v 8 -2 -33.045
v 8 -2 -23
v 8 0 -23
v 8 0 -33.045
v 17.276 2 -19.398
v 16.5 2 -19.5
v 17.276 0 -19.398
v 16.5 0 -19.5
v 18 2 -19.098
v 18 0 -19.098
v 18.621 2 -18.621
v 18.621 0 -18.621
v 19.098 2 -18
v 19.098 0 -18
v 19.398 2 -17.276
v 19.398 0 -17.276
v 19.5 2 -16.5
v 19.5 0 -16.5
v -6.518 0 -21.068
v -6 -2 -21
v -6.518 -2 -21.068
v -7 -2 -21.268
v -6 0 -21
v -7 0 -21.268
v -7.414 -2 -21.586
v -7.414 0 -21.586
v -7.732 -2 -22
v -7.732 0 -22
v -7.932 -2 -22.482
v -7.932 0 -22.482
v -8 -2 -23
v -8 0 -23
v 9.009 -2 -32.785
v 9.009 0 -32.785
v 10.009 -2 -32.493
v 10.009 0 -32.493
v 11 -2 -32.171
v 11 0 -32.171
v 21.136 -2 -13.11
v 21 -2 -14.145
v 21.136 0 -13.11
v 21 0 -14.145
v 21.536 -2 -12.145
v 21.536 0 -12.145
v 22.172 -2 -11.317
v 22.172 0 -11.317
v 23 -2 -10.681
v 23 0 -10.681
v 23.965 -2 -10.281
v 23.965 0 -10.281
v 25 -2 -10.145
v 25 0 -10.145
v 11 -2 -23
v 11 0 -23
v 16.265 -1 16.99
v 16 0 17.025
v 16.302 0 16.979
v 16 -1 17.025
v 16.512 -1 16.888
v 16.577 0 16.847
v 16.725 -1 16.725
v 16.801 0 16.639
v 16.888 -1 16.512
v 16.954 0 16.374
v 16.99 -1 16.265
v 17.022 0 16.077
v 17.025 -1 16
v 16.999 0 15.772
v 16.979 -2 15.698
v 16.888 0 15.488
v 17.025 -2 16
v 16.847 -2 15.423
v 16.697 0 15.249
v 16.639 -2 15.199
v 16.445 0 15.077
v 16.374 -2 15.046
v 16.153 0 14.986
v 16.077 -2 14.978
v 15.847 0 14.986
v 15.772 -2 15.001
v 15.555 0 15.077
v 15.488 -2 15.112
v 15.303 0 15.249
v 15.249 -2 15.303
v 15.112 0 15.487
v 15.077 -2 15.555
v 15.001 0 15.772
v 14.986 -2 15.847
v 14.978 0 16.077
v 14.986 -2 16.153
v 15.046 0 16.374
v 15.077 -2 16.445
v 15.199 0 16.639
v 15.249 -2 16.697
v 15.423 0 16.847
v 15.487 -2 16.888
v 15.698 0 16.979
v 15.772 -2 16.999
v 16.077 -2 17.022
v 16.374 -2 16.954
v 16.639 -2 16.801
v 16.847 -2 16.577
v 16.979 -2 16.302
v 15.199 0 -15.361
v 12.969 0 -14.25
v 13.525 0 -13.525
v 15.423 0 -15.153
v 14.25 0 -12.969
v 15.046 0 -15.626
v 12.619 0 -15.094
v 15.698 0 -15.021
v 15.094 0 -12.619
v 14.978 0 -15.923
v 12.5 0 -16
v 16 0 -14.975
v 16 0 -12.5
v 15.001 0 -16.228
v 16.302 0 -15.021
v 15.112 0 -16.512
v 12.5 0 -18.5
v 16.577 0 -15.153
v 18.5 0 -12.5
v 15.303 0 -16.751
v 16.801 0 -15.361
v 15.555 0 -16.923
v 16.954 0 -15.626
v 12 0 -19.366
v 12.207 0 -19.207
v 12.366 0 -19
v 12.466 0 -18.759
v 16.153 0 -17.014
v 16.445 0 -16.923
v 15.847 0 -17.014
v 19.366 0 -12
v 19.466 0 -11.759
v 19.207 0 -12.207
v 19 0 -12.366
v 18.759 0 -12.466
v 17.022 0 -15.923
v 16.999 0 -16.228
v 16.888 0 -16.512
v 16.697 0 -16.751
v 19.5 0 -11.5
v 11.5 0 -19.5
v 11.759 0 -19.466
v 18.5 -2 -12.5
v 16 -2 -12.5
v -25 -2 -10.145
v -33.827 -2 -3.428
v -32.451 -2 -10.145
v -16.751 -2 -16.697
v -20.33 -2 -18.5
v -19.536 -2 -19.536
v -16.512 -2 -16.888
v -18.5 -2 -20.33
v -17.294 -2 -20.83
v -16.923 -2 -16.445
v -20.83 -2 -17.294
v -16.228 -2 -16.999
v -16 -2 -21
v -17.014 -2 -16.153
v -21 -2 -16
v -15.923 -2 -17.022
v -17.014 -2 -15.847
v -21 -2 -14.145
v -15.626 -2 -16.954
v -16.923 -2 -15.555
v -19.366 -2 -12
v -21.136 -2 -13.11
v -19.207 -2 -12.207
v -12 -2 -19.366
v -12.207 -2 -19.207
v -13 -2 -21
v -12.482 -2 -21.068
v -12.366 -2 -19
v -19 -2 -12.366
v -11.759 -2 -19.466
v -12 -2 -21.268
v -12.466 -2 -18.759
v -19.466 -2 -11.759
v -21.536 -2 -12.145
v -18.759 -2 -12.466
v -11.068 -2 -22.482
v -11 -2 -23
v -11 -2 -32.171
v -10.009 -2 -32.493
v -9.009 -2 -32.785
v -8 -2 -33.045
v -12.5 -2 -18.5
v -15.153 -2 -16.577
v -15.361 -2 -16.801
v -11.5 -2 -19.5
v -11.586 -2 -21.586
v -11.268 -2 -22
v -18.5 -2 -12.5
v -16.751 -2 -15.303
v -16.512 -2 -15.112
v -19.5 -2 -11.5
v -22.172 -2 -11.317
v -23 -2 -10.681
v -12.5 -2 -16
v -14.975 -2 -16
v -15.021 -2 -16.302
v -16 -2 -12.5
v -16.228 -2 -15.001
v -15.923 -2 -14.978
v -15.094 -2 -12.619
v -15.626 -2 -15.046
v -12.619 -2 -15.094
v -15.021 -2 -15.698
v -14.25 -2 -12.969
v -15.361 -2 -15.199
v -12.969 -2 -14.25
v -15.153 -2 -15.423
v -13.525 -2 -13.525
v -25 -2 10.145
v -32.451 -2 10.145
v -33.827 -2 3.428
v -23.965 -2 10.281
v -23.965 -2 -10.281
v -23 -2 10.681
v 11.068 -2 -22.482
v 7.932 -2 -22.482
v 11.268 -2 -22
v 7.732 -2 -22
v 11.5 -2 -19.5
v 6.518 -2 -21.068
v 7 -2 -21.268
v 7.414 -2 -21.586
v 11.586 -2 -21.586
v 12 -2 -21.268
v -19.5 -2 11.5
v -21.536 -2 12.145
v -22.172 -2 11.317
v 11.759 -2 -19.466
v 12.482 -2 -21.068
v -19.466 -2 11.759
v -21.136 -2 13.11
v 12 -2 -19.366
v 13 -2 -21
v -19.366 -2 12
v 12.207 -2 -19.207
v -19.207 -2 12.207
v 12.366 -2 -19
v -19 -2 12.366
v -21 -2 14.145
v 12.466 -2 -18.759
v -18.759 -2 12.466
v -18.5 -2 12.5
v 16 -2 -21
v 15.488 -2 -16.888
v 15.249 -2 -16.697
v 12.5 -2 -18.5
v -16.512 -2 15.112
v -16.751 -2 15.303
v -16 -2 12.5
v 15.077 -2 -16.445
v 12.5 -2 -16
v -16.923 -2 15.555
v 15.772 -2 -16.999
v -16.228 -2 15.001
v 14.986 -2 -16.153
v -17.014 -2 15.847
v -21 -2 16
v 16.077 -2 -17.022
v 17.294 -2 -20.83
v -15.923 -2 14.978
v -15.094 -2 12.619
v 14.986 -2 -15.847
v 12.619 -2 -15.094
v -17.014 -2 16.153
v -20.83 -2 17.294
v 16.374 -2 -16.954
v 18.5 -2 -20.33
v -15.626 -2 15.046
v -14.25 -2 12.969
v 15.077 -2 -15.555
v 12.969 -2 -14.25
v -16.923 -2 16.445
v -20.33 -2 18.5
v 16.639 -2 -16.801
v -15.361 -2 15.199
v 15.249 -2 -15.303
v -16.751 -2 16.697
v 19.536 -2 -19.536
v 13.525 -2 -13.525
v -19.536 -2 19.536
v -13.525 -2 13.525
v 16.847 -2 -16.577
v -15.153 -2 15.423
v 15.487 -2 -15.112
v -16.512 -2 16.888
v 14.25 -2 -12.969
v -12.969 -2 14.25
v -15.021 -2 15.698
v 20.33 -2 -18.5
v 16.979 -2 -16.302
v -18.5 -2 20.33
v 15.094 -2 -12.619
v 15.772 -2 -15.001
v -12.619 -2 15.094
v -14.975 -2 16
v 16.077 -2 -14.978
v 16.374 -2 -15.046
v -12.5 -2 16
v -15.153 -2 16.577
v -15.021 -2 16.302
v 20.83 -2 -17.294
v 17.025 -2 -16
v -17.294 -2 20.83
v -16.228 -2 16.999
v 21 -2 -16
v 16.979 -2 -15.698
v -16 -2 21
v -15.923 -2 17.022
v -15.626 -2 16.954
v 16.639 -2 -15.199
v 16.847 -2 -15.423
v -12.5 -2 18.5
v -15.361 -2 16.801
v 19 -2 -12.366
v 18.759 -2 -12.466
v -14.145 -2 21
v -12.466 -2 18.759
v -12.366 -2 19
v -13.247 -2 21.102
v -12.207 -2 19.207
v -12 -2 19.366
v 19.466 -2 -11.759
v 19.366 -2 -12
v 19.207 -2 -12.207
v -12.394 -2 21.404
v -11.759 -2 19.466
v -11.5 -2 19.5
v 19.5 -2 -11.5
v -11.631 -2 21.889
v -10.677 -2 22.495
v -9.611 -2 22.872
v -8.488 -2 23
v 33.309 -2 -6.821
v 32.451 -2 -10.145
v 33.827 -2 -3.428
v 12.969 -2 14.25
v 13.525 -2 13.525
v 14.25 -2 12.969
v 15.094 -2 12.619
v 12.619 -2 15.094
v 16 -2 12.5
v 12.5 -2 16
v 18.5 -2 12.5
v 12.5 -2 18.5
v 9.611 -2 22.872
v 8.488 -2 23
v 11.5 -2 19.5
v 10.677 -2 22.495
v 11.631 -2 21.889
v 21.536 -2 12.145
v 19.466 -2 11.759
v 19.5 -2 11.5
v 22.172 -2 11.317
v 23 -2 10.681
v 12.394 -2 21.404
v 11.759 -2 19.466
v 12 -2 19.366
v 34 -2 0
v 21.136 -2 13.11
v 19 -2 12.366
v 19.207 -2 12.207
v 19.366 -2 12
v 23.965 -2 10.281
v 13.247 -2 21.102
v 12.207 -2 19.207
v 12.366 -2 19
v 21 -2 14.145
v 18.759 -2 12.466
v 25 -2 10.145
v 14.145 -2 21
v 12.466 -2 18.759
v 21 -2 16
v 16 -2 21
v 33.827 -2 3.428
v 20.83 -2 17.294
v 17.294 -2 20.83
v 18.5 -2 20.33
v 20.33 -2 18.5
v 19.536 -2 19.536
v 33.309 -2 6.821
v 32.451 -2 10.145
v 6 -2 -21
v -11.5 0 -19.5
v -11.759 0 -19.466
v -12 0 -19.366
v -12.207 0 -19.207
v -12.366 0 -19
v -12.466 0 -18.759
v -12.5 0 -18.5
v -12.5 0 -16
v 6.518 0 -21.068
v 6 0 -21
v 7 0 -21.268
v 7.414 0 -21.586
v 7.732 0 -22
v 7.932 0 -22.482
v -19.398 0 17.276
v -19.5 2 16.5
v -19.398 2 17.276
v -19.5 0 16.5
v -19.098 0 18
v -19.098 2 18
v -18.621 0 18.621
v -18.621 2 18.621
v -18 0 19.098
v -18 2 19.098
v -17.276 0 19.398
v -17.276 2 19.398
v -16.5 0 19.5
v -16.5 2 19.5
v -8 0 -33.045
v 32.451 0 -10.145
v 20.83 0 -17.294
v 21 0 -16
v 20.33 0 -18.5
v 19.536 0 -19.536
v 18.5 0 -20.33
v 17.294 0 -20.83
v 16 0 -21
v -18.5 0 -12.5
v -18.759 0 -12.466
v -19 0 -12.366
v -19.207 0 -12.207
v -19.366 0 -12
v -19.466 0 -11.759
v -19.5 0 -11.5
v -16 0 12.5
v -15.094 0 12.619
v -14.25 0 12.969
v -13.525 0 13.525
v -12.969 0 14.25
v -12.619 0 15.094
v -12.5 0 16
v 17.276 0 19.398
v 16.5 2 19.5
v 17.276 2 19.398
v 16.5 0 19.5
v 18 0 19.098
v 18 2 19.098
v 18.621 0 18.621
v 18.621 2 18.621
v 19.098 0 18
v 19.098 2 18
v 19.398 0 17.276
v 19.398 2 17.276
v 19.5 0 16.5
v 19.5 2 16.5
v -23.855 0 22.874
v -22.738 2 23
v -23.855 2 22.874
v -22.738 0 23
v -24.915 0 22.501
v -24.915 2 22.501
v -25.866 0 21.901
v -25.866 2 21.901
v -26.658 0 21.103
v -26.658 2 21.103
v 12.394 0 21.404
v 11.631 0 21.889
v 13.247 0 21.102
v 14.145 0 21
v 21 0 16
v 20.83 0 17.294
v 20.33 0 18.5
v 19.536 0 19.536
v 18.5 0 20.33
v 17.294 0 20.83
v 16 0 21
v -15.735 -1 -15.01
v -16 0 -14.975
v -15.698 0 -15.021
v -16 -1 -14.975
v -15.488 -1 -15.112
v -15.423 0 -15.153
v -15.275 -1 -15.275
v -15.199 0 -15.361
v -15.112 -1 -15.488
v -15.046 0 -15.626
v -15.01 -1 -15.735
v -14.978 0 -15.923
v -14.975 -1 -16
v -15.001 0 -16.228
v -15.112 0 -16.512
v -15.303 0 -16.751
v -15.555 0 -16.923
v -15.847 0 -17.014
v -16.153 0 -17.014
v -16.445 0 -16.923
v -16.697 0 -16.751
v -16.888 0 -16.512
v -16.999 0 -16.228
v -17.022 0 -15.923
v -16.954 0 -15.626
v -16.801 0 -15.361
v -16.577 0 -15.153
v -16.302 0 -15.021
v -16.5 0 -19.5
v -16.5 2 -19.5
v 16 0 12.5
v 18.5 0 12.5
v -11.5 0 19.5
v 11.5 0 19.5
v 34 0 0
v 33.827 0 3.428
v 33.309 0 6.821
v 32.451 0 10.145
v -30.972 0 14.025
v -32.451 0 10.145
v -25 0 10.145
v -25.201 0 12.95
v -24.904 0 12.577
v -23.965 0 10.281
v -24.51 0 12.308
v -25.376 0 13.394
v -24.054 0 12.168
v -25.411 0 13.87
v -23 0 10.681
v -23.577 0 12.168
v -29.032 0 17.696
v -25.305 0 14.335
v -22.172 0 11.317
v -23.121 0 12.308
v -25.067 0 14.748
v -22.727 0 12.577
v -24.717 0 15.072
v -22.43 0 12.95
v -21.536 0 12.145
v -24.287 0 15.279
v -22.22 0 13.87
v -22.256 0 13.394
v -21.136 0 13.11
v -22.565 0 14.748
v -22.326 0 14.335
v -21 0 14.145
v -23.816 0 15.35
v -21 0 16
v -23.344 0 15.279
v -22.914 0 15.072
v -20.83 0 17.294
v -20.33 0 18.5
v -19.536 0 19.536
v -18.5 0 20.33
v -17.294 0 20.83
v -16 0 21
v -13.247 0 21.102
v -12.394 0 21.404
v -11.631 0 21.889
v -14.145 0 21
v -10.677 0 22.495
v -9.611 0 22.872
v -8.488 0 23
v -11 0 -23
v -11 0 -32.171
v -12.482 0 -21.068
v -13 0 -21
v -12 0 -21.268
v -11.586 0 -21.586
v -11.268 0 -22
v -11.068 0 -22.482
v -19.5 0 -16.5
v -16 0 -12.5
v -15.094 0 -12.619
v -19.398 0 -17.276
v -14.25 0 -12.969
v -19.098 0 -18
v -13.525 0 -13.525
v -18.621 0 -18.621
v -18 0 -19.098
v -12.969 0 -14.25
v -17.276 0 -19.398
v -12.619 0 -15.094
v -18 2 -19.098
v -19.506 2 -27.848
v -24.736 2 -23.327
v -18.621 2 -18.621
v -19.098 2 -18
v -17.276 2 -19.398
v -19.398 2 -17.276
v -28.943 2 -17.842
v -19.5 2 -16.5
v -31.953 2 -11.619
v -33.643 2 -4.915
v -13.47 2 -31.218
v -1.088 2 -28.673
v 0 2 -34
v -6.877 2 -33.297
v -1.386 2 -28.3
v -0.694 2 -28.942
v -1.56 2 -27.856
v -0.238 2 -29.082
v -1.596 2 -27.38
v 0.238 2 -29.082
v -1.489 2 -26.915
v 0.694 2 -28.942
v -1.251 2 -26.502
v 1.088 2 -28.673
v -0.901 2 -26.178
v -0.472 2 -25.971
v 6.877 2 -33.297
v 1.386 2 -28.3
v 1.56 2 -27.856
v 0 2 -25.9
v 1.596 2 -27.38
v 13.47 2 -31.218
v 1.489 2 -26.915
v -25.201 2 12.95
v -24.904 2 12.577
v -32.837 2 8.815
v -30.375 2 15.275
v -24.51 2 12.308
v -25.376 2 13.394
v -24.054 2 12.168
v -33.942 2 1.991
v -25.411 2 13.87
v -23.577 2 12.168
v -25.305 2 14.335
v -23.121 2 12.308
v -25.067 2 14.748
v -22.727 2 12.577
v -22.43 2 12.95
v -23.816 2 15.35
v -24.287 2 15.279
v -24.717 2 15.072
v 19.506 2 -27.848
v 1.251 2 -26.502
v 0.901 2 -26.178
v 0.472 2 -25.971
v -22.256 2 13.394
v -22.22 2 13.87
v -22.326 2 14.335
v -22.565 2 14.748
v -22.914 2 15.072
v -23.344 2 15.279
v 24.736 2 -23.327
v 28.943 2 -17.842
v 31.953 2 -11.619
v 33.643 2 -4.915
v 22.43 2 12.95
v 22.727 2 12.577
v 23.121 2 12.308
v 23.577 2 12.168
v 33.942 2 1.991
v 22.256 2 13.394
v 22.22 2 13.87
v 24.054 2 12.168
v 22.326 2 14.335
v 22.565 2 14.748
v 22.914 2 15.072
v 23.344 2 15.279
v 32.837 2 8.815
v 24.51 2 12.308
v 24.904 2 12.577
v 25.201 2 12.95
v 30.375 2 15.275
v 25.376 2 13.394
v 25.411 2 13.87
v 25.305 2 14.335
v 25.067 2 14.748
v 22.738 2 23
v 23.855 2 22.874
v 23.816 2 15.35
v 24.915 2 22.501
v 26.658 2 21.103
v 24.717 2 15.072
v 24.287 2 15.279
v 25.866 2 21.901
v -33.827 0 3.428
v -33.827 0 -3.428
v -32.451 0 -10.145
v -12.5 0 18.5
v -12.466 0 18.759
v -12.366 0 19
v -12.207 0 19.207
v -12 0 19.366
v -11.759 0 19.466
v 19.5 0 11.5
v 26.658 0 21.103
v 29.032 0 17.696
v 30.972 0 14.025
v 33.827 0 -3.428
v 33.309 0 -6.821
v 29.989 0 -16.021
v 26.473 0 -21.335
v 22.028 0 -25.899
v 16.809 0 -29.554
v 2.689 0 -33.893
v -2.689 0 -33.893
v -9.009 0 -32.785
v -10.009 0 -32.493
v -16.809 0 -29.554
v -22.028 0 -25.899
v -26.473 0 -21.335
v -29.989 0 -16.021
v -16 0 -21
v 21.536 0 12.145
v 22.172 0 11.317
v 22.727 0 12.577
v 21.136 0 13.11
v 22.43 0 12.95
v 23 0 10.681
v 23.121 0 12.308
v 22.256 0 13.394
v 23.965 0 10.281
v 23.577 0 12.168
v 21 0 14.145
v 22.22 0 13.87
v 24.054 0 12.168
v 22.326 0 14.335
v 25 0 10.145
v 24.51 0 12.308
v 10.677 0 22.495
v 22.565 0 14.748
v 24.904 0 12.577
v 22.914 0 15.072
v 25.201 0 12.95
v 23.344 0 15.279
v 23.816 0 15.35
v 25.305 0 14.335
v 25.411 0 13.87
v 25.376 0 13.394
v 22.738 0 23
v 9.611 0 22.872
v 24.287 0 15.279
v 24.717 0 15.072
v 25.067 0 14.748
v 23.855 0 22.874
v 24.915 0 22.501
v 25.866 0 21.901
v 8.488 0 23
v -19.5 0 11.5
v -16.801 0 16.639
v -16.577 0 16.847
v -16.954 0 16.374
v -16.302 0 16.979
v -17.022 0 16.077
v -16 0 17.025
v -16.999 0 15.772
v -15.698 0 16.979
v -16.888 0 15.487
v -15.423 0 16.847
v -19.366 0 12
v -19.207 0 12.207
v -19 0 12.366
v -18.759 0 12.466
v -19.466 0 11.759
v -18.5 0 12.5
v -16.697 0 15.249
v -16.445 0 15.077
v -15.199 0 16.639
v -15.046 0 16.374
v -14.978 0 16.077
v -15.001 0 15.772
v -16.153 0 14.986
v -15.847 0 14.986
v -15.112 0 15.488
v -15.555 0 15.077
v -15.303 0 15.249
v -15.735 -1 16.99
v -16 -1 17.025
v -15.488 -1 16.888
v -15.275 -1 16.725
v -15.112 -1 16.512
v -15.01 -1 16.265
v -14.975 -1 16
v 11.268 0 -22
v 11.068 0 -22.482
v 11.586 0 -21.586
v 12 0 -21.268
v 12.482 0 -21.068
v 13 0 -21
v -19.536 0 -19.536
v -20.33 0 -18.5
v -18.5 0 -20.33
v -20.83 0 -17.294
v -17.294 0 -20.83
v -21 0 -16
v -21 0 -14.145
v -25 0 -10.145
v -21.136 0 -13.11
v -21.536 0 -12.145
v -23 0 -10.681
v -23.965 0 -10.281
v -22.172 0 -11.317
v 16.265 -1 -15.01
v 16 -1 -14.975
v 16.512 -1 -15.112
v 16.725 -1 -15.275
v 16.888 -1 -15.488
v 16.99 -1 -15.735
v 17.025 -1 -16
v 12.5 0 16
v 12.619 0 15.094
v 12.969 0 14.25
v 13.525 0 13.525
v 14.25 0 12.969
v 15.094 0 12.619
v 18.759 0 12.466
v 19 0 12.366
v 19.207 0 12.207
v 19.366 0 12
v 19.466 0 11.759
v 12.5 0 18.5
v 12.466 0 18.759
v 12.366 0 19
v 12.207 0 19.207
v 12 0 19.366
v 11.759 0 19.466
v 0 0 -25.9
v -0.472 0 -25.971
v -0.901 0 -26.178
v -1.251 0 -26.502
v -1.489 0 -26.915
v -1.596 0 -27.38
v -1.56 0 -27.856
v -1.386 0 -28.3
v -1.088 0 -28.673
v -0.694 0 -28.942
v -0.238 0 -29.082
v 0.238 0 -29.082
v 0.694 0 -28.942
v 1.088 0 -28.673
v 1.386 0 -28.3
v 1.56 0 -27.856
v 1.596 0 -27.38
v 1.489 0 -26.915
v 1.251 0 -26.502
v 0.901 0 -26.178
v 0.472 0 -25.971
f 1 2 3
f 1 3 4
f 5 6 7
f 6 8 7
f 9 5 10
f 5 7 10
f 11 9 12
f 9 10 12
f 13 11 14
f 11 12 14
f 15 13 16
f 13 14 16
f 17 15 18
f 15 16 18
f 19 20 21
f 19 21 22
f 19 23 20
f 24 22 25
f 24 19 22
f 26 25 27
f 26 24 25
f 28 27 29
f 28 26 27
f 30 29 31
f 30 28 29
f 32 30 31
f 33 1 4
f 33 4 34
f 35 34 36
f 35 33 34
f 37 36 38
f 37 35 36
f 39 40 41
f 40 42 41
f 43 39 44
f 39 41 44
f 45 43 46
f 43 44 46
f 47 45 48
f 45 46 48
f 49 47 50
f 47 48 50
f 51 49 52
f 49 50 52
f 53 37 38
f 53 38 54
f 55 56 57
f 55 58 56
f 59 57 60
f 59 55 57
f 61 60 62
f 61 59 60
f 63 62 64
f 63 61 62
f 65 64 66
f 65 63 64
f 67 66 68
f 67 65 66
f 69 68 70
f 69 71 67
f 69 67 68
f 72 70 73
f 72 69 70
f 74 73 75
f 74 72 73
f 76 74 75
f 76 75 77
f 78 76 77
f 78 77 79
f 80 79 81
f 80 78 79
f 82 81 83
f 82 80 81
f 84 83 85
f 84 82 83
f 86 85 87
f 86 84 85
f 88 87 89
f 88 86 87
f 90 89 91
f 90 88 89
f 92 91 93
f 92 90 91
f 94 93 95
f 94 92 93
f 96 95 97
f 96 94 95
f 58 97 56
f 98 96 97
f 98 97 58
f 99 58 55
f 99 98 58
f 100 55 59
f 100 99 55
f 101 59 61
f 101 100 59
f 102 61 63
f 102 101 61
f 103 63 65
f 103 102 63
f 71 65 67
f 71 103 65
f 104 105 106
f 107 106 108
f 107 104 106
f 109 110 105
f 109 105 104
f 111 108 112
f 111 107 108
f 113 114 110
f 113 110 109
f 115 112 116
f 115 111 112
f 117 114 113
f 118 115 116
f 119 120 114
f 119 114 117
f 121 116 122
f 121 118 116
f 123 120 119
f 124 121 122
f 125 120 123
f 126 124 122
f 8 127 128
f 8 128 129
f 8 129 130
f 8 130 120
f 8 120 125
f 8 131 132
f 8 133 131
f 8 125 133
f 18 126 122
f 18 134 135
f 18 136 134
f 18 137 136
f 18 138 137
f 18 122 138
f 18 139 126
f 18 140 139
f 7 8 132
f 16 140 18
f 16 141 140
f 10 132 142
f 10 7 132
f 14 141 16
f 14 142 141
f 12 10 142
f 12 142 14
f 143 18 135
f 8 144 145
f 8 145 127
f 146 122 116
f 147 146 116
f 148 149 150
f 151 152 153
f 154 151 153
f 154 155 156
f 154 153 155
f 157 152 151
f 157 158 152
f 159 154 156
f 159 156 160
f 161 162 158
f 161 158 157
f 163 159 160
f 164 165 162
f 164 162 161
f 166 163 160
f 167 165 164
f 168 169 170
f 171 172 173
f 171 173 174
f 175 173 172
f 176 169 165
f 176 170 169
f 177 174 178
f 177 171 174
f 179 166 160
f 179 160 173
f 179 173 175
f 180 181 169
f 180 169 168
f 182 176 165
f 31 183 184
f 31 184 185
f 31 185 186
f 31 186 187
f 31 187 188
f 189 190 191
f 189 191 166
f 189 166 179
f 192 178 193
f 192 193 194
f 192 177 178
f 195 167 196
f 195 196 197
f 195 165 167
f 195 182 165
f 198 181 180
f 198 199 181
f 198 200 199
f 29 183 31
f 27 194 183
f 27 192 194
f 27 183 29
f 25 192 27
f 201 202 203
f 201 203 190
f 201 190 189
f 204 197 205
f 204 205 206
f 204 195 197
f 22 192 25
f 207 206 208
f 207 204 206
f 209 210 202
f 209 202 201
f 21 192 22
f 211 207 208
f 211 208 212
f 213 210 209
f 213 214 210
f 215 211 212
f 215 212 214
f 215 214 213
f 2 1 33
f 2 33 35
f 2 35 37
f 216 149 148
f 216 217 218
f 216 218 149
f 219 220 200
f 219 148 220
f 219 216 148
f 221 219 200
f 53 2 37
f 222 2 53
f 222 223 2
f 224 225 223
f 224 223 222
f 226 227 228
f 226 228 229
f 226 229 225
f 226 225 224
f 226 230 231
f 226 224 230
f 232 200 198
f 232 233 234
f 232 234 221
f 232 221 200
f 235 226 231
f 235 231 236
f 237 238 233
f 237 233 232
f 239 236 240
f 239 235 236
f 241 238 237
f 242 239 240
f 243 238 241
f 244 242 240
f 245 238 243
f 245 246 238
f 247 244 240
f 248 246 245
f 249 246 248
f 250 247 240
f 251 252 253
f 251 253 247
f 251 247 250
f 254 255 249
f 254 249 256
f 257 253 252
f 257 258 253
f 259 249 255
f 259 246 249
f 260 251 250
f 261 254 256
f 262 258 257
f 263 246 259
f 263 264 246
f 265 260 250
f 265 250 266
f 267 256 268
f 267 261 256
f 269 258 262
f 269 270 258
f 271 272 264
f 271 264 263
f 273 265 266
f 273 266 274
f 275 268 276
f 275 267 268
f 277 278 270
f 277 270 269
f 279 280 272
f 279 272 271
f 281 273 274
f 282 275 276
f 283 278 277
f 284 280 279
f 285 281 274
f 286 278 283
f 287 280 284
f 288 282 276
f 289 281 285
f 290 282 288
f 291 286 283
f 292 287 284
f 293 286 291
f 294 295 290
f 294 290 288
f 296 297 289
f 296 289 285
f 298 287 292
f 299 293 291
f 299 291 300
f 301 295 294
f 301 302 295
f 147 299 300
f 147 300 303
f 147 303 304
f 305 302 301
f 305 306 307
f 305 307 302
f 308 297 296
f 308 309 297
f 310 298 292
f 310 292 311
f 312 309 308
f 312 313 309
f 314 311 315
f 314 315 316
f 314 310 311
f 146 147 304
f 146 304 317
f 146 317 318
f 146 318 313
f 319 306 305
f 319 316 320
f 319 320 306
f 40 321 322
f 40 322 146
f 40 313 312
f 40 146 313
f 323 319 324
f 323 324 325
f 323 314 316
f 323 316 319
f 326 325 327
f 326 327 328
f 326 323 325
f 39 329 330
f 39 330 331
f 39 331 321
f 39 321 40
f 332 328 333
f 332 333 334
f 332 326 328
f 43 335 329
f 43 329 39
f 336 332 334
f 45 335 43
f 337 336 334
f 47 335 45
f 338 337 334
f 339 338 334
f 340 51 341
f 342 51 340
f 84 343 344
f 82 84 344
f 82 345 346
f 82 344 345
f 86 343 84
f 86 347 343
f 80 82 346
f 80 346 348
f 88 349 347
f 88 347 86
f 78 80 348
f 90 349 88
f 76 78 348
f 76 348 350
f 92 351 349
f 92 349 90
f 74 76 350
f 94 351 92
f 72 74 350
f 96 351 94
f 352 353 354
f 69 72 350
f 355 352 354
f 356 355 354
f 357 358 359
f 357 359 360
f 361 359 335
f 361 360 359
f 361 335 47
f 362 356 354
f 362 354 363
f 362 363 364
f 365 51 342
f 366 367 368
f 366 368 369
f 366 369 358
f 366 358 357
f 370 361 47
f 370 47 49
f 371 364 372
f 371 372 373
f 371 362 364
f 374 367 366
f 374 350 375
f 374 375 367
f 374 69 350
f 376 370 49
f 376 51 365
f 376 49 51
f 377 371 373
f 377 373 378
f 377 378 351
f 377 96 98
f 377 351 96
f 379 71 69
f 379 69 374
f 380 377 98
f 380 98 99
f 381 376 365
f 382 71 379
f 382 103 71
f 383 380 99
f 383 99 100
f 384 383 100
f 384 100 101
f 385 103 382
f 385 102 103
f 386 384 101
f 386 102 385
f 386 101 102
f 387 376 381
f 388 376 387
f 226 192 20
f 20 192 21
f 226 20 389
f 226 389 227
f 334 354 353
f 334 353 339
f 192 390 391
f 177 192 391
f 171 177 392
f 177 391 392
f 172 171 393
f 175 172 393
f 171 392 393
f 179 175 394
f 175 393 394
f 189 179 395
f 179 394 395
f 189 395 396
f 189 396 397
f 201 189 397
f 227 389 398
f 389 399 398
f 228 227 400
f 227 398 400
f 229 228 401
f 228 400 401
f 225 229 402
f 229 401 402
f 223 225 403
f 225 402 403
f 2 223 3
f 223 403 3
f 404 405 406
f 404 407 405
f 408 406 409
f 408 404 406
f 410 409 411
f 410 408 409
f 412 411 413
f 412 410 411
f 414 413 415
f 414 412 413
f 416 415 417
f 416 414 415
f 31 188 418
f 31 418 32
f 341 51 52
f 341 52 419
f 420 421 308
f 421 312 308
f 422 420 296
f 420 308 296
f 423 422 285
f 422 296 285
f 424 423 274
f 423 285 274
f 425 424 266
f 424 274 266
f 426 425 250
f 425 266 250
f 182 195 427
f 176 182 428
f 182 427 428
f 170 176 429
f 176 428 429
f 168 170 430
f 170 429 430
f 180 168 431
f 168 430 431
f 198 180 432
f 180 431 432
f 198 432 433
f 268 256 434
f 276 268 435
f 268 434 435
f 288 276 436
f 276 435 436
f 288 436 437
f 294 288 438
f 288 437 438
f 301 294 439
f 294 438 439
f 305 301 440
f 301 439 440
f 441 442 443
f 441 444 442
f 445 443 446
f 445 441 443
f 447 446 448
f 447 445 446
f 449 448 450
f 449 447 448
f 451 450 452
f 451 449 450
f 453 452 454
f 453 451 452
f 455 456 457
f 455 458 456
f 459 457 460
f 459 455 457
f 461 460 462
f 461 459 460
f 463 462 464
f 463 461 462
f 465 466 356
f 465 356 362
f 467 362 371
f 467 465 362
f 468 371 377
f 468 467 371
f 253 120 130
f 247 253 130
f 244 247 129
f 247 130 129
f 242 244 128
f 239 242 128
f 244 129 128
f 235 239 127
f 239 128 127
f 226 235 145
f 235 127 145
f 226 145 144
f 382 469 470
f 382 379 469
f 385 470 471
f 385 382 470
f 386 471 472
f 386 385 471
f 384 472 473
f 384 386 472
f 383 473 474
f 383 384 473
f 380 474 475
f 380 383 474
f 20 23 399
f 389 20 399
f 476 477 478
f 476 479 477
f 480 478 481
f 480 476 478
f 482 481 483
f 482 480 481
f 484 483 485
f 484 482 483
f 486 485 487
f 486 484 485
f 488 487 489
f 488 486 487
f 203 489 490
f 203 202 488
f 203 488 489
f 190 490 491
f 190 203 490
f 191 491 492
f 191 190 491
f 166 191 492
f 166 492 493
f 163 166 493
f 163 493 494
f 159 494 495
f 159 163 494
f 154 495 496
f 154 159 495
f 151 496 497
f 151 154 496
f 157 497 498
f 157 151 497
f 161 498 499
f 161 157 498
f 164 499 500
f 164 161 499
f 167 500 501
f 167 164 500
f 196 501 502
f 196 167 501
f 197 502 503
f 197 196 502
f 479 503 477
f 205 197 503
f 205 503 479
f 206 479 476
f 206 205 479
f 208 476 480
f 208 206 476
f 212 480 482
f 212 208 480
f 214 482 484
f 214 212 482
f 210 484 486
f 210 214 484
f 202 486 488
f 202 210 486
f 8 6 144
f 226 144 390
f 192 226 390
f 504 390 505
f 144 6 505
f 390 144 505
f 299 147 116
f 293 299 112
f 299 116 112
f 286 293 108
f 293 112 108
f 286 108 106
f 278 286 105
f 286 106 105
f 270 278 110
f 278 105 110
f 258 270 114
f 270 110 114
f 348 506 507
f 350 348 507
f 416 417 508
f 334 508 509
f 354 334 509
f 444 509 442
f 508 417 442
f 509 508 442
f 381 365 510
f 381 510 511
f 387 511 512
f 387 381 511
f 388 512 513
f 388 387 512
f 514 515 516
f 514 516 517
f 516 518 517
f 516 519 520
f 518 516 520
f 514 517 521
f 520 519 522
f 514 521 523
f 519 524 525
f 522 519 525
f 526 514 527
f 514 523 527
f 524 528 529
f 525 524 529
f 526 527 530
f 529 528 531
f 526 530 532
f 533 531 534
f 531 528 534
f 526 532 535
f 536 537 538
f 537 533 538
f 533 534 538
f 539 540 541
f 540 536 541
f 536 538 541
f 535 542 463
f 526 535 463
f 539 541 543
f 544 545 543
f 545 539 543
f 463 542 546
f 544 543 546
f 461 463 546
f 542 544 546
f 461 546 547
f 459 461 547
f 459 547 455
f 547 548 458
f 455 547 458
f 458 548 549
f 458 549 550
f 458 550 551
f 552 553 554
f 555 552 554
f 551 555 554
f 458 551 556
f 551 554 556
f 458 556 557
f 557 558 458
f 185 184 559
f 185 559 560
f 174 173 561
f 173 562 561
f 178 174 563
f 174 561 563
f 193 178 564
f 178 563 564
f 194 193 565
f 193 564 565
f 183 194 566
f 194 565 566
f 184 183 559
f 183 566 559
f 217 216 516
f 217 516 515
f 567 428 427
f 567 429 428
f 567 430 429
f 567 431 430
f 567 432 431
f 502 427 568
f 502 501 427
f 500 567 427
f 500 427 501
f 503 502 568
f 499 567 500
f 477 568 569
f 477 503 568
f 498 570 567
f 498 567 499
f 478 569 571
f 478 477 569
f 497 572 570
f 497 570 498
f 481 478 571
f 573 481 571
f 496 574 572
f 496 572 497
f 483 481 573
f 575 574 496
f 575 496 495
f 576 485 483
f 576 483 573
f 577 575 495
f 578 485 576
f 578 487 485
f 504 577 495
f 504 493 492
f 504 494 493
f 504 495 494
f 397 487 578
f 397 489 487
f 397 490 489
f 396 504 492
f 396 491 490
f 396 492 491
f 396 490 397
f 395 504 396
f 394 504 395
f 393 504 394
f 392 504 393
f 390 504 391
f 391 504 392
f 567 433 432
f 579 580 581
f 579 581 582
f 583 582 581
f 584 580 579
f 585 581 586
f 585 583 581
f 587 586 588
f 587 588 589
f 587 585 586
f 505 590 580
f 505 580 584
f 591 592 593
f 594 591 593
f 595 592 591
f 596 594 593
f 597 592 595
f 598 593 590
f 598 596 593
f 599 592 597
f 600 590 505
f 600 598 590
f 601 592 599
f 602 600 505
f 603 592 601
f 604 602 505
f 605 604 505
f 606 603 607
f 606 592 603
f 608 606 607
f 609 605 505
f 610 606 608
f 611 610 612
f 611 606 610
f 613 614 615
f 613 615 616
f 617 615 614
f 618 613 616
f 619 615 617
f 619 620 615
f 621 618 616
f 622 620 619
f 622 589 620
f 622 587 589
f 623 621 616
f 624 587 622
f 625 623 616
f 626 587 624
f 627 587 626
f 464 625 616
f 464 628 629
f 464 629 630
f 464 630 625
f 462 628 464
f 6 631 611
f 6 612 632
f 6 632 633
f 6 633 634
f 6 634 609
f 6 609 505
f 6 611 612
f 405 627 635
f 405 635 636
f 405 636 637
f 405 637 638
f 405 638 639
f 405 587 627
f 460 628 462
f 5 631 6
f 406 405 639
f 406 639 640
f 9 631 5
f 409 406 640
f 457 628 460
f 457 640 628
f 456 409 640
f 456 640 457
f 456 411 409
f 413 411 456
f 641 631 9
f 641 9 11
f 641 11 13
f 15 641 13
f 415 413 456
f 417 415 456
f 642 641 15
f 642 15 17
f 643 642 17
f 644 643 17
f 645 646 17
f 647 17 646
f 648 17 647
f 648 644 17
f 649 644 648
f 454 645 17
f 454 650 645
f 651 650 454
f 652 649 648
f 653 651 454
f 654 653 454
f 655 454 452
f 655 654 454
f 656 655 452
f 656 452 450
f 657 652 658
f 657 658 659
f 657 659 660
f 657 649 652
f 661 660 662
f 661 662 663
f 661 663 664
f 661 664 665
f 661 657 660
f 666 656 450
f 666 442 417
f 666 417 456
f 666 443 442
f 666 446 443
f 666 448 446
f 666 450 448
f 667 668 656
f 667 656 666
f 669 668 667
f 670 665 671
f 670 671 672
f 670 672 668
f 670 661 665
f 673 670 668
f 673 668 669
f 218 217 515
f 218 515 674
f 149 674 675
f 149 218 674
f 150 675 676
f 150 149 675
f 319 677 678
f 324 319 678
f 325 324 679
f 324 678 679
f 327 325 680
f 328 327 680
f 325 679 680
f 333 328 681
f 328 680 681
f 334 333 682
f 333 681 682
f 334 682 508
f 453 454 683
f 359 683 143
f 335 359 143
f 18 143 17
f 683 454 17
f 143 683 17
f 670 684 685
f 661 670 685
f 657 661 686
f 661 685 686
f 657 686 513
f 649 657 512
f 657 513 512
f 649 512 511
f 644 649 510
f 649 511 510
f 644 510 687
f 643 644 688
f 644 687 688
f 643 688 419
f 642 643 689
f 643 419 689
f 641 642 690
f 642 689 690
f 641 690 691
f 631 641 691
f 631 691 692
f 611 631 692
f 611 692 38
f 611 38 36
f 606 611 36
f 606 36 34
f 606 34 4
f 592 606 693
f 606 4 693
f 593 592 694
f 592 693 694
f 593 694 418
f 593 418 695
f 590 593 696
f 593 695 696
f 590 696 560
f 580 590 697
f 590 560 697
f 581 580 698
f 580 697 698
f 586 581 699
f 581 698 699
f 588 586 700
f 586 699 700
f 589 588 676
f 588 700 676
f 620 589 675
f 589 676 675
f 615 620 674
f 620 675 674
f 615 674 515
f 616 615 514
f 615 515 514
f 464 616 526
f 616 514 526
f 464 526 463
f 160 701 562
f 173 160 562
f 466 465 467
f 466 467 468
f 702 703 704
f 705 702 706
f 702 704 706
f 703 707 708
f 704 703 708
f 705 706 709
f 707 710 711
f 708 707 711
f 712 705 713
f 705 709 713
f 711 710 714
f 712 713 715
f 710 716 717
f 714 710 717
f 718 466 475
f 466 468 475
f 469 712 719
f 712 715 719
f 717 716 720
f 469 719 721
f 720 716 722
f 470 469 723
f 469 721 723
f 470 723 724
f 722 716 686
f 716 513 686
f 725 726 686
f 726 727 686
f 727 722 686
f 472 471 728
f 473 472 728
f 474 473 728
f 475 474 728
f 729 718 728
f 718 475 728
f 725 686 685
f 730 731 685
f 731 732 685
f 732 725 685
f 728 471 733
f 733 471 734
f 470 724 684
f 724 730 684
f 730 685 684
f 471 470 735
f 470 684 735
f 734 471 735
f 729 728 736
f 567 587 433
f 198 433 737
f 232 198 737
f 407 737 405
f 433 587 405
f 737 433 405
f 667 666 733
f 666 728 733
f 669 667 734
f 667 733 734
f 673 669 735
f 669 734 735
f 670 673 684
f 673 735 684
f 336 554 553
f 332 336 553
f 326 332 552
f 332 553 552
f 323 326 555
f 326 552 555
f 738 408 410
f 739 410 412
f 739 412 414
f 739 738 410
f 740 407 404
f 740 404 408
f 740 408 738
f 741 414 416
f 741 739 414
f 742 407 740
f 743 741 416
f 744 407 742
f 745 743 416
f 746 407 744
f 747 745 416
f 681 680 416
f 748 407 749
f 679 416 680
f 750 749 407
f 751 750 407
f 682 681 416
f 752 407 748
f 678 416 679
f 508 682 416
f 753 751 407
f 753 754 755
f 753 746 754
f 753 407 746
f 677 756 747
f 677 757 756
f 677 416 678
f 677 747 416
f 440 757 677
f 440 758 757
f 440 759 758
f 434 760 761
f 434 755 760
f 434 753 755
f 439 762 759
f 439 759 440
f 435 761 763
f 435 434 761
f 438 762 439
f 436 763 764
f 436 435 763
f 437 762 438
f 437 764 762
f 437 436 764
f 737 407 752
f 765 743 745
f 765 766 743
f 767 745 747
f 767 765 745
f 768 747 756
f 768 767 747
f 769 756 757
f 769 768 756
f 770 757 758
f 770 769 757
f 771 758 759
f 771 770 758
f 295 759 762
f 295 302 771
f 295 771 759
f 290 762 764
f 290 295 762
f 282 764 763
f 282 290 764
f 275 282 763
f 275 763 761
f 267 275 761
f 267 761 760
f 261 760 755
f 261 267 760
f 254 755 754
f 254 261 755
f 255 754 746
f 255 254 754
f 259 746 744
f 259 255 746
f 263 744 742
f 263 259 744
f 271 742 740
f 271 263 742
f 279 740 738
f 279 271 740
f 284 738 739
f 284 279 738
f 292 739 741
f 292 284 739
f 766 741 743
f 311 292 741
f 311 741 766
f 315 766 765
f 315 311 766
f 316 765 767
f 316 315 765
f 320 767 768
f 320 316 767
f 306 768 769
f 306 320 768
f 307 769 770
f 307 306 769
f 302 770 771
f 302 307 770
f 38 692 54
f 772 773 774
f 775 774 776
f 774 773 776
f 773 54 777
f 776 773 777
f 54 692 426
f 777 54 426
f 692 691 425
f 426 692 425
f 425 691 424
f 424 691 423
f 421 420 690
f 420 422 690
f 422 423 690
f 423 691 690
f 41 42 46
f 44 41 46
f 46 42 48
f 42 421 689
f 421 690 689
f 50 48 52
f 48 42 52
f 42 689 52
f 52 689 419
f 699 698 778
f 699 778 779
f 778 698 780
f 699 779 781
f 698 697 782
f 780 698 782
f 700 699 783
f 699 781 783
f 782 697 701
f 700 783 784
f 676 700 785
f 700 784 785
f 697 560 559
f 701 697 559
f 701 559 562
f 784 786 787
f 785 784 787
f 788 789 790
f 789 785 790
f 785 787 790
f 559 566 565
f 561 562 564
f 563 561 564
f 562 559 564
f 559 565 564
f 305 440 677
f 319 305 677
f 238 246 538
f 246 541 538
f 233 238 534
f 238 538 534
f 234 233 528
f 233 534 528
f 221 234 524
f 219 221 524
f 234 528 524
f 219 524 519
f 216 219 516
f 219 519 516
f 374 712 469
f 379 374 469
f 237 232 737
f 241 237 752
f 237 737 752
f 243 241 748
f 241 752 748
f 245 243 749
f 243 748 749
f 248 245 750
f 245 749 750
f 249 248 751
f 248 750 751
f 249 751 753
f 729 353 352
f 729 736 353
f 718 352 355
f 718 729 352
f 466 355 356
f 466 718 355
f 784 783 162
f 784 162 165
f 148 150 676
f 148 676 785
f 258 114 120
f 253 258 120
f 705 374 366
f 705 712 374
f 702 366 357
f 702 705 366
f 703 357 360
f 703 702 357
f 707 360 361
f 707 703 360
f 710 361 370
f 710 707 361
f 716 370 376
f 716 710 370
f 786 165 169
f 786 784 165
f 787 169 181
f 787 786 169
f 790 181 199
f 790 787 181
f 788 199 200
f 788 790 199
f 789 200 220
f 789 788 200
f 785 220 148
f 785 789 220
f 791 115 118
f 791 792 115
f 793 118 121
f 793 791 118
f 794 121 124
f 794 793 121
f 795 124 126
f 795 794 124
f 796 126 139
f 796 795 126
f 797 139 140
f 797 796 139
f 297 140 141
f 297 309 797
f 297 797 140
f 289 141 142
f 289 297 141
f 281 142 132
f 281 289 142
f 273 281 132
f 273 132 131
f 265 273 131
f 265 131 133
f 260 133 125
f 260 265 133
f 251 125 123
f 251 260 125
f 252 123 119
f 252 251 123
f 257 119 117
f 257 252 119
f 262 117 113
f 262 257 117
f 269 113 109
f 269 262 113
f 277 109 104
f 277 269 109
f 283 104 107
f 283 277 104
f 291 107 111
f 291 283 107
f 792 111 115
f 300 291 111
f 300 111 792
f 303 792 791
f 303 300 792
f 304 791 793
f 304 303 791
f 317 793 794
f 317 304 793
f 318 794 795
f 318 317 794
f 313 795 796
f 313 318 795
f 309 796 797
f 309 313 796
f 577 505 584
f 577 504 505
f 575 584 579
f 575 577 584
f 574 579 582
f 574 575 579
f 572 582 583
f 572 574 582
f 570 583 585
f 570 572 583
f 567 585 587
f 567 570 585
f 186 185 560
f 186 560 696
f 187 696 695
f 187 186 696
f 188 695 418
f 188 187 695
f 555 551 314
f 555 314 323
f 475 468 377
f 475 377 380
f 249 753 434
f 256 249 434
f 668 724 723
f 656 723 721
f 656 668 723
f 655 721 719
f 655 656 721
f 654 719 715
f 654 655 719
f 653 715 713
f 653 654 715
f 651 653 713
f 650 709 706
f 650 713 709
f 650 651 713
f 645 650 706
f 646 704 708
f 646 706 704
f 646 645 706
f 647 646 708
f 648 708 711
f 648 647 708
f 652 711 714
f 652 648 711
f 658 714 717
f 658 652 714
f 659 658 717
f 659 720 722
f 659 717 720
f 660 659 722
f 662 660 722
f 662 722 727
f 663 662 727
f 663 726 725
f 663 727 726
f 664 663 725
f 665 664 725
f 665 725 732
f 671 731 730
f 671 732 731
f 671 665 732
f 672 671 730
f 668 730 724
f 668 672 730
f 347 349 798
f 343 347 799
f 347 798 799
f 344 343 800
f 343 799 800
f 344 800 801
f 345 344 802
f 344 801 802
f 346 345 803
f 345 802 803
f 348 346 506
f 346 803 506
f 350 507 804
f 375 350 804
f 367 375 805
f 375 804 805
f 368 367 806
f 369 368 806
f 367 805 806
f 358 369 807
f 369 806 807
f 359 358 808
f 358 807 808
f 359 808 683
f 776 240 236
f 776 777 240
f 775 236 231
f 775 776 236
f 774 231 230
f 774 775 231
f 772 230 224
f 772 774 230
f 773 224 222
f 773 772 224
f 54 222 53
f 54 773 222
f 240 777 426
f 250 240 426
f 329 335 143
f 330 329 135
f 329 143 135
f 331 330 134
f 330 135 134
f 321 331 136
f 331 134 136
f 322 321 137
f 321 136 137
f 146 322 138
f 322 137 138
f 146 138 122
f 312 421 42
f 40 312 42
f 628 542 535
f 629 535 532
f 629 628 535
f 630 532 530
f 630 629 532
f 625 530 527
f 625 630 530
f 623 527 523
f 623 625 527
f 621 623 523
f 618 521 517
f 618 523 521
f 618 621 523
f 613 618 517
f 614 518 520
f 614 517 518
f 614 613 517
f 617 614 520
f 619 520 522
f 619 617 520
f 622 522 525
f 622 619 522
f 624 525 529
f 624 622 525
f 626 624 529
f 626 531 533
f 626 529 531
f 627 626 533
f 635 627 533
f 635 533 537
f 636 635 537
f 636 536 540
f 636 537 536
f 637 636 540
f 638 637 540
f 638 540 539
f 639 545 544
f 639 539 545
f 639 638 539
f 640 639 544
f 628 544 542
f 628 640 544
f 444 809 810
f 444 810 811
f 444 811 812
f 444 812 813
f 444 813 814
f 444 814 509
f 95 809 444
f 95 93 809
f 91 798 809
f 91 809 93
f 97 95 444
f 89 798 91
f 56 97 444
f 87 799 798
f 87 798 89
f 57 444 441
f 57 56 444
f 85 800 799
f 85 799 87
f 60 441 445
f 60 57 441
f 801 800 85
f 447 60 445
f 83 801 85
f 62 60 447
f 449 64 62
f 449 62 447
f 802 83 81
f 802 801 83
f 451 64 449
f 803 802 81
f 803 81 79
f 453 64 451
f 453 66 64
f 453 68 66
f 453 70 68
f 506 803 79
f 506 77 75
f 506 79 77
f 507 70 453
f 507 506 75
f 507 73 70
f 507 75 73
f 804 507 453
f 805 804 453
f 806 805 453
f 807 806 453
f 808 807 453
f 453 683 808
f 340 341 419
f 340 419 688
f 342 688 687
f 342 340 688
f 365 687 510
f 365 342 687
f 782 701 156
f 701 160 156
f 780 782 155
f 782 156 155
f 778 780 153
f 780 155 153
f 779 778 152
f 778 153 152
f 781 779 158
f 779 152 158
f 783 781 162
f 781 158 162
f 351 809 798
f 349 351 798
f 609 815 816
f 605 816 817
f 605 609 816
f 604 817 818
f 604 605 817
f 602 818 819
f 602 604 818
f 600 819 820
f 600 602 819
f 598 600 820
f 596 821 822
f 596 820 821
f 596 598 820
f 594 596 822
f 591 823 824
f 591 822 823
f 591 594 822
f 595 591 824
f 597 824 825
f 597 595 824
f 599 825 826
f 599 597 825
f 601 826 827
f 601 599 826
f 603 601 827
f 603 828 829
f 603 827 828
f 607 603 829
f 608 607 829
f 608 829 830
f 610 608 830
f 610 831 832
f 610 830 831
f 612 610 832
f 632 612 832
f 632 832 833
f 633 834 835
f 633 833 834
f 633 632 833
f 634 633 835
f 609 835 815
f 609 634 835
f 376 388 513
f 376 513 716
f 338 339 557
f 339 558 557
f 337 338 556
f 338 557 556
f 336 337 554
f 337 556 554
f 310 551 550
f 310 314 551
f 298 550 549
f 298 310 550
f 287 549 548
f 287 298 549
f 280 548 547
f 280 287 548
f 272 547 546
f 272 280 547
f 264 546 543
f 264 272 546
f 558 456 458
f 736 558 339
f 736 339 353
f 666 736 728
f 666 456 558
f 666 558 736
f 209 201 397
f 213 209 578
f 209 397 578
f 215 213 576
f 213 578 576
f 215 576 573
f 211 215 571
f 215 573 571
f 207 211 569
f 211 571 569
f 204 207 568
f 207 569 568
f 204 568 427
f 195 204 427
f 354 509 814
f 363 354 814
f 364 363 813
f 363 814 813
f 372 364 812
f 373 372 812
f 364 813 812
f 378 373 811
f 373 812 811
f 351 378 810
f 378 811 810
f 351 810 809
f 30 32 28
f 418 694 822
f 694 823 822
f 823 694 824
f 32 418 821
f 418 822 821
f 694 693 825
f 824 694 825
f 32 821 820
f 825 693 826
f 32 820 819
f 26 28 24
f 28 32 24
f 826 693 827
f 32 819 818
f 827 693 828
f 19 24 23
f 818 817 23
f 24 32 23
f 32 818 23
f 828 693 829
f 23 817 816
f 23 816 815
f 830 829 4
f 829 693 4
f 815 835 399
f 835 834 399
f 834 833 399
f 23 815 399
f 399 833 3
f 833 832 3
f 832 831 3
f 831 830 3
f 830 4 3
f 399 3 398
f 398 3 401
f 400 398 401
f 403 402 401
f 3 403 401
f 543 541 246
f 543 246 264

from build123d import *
from build123d.topology import SkipClean

# Parameters (mm, degrees)
SKETCH1_R                         = 34
BOSS_EXTRUDE1_DEPTH               = 2
M2_CLEARANCE_HOLE1_D              = 2.4
SKETCH11_W                        = 42
SKETCH11_H                        = 42
BOSS_EXTRUDE3_DEPTH               = 2
TAP_START                         = -2
TAP_DRILL_FOR_M2_5_TAP1_OUTLINE_R = 1.025
TAP_DRILL_FOR_M2_5_TAP1_DEPTH     = 4
CUT_EXTRUDE1_DEPTH                = 49.124837662
CUT_EXTRUDE1_DEPTH_BACK           = 2
SKETCH10_R                        = 1.6
SKETCH12_W                        = 39
SKETCH12_H                        = 39
CUT_EXTRUDE2_DEPTH                = 3
SKETCH13_R                        = 1.025
BOSS_EXTRUDE4_DEPTH               = 1
FILLET1_R                         = 1
FILLET2_R                         = 5
CUT_EXTRUDE3_DEPTH                = 49.176757882
BOSS_EXTRUDE5_START               = 2
BOSS_EXTRUDE5_DEPTH               = 2
FILLET3_R                         = 4
FILLET4_R                         = 2
FILLET5_R                         = 3
CUT_EXTRUDE4_DEPTH                = 49.124837662
CUT_EXTRUDE4_DEPTH_BACK           = 49.124837662
SKETCH16_W                        = 58.171472577
SKETCH16_H                        = 11
FILLET6_R                         = 5


# Read off the part's stored shape, not the designer's step: Tap Drill for M2.5 Tap1
with BuildPart() as part:
    # Sketch1 → Boss-Extrude1 (new body)
    with BuildSketch(Plane(origin=(0, 0, 0), x_dir=(1, 0, 0), z_dir=(0, 1, 0))):
        with Locations(Location((0, 0, 0), (0, 0, 270))):
            Circle(SKETCH1_R)
    extrude(amount=BOSS_EXTRUDE1_DEPTH)

    # M2 Clearance Hole1 (through all)
    with Locations(Plane(origin=(0, 2, 0), x_dir=(1, 0, 0), z_dir=(0, 1, 0))):
        with Locations((-23.815698604, -13.75), (0, 27.5), (23.815698604, -13.75)):
            Hole(M2_CLEARANCE_HOLE1_D / 2)

    # Sketch11 → Boss-Extrude3 (add)
    with BuildSketch(Plane.XZ):
        Rectangle(SKETCH11_W, SKETCH11_H)
    extrude(amount=BOSS_EXTRUDE3_DEPTH)

    # Tap Drill for M2.5 Tap1 outline → Tap Drill for M2.5 Tap1 (cut)
    with BuildSketch(Plane(origin=(0, 0, 0), x_dir=(1, 0, 0), z_dir=(0, 1, 0)).offset(TAP_START)):
        with Locations((-16, 16)):
            Circle(TAP_DRILL_FOR_M2_5_TAP1_OUTLINE_R)
        with Locations((16, -16)):
            Circle(TAP_DRILL_FOR_M2_5_TAP1_OUTLINE_R)
        with Locations((16, 16)):
            Circle(TAP_DRILL_FOR_M2_5_TAP1_OUTLINE_R)
        with Locations((-16, -16)):
            Circle(TAP_DRILL_FOR_M2_5_TAP1_OUTLINE_R)
    extrude(amount=TAP_DRILL_FOR_M2_5_TAP1_DEPTH, mode=Mode.SUBTRACT)

    # Sketch10 → Cut-Extrude1 (cut, two sides: drawn at the far end of the back side and taken through both)
    with BuildSketch(Plane.XZ.offset(-CUT_EXTRUDE1_DEPTH_BACK)):
        with Locations(Location((0, -27.5, 0), (0, 0, 90))):
            Circle(SKETCH10_R)
        with Locations(Location((-23.815698604, 13.75, 0), (0, 0, 90))):
            Circle(SKETCH10_R)
        with Locations(Location((23.815698604, 13.75, 0), (0, 0, 90))):
            Circle(SKETCH10_R)
    extrude(amount=CUT_EXTRUDE1_DEPTH + CUT_EXTRUDE1_DEPTH_BACK, mode=Mode.SUBTRACT)

    # Sketch12 → Cut-Extrude2 (cut)
    with BuildSketch(Plane(origin=(0, 2, 0), x_dir=(1, 0, 0), z_dir=(0, 1, 0))):
        Rectangle(SKETCH12_W, SKETCH12_H)
    extrude(amount=-CUT_EXTRUDE2_DEPTH, mode=Mode.SUBTRACT)

    # Sketch13 → Boss-Extrude4 (add)
    # profile 1 of 4: a face of its own
    with BuildSketch(Plane(origin=(0, -1, 0), x_dir=(1, 0, 0), z_dir=(0, 1, 0))):
        with BuildLine():
            Line((-12.5, 16), (-12.5, 19.5))
            Line((-12.5, 19.5), (-19.5, 19.5))
            Line((-19.5, 19.5), (-19.5, 12.5))
            Line((-19.5, 12.5), (-16, 12.5))
            ThreePointArc((-16, 12.5), (-13.525126266, 13.525126266), (-12.5, 16))
        make_face()
        with Locations(Location((-16, 16, 0), (0, 0, 270))):
            Circle(SKETCH13_R, mode=Mode.SUBTRACT)
    # profile 2 of 4: a face of its own
    with BuildSketch(Plane(origin=(0, -1, 0), x_dir=(1, 0, 0), z_dir=(0, 1, 0))):
        with BuildLine():
            Line((16, 12.5), (19.5, 12.5))
            Line((19.5, 12.5), (19.5, 19.5))
            Line((19.5, 19.5), (12.5, 19.5))
            Line((12.5, 19.5), (12.5, 16))
            ThreePointArc((12.5, 16), (13.525126266, 13.525126266), (16, 12.5))
        make_face()
        with Locations(Location((16, 16, 0), (0, 0, 270))):
            Circle(SKETCH13_R, mode=Mode.SUBTRACT)
    # profile 3 of 4: a face of its own
    with BuildSketch(Plane(origin=(0, -1, 0), x_dir=(1, 0, 0), z_dir=(0, 1, 0))):
        with BuildLine():
            Line((12.5, -16), (12.5, -19.5))
            Line((12.5, -19.5), (19.5, -19.5))
            Line((19.5, -19.5), (19.5, -12.5))
            Line((19.5, -12.5), (16, -12.5))
            ThreePointArc((16, -12.5), (13.525126266, -13.525126266), (12.5, -16))
        make_face()
        with Locations(Location((16, -16, 0), (0, 0, 270))):
            Circle(SKETCH13_R, mode=Mode.SUBTRACT)
    # profile 4 of 4: a face of its own
    with BuildSketch(Plane(origin=(0, -1, 0), x_dir=(1, 0, 0), z_dir=(0, 1, 0))):
        with BuildLine():
            Line((-16, -12.5), (-19.5, -12.5))
            Line((-19.5, -12.5), (-19.5, -19.5))
            Line((-19.5, -19.5), (-12.5, -19.5))
            Line((-12.5, -19.5), (-12.5, -16))
            ThreePointArc((-12.5, -16), (-13.525126266, -13.525126266), (-16, -12.5))
        make_face()
        with Locations(Location((-16, -16, 0), (0, 0, 270))):
            Circle(SKETCH13_R, mode=Mode.SUBTRACT)
    extrude(amount=BOSS_EXTRUDE4_DEPTH)

    # Fillet1
    fillet1_edges = [part.edges().sort_by_distance(p)[0] for p in [
        (-12.5, -0.5, -19.5),
        (-19.5, -0.5, -12.5),
        (19.5, -0.5, -12.5),
        (12.5, -0.5, -19.5),
        (12.5, -0.5, 19.5),
        (19.5, -0.5, 12.5),
        (-19.5, -0.5, 12.5),
        (-12.5, -0.5, 19.5),
    ]]
    fillet(fillet1_edges, radius=FILLET1_R)

    # Fillet2
    fillet2_edges = [part.edges().sort_by_distance(p)[0] for p in [
        (21, -1, -21),
        (21, -1, 21),
        (-21, -1, 21),
        (-21, -1, -21),
    ]]
    fillet(fillet2_edges, radius=FILLET2_R)

    # Sketch14 → Cut-Extrude3 (cut, through all)
    with BuildSketch(Plane(origin=(0, -1, 0), x_dir=(1, 0, 0), z_dir=(0, 1, 0))):
        with BuildLine():
            Line((12.5, 16), (12.5, 18.5))
            ThreePointArc((12.5, 18.5), (12.207106781, 19.207106781), (11.5, 19.5))
            Line((11.5, 19.5), (-11.5, 19.5))
            ThreePointArc((-11.5, 19.5), (-12.207106781, 19.207106781), (-12.5, 18.5))
            Line((-12.5, 18.5), (-12.5, 16))
            ThreePointArc((-12.5, 16), (-13.525126266, 13.525126266), (-16, 12.5))
            Line((-16, 12.5), (-18.5, 12.5))
            ThreePointArc((-18.5, 12.5), (-19.207106781, 12.207106781), (-19.5, 11.5))
            Line((-19.5, 11.5), (-19.5, -11.5))
            ThreePointArc((-19.5, -11.5), (-19.207106781, -12.207106781), (-18.5, -12.5))
            Line((-18.5, -12.5), (-16, -12.5))
            ThreePointArc((-16, -12.5), (-13.525126266, -13.525126266), (-12.5, -16))
            Line((-12.5, -16), (-12.5, -18.5))
            ThreePointArc((-12.5, -18.5), (-12.207106781, -19.207106781), (-11.5, -19.5))
            Line((-11.5, -19.5), (11.5, -19.5))
            ThreePointArc((11.5, -19.5), (12.207106781, -19.207106781), (12.5, -18.5))
            Line((12.5, -18.5), (12.5, -16))
            ThreePointArc((12.5, -16), (13.525126266, -13.525126266), (16, -12.5))
            Line((16, -12.5), (18.5, -12.5))
            ThreePointArc((18.5, -12.5), (19.207106781, -12.207106781), (19.5, -11.5))
            Line((19.5, -11.5), (19.5, 11.5))
            ThreePointArc((19.5, 11.5), (19.207106781, 12.207106781), (18.5, 12.5))
            Line((18.5, 12.5), (16, 12.5))
            ThreePointArc((16, 12.5), (13.525126266, 13.525126266), (12.5, 16))
        make_face()
    extrude(amount=-CUT_EXTRUDE3_DEPTH, mode=Mode.SUBTRACT)

    # Sketch15 → Boss-Extrude5 (add)
    with SkipClean():  # the faces are left unmerged after this step: merging them gives an invalid solid
        with BuildSketch(Plane.XZ.offset(BOSS_EXTRUDE5_START)):
            with BuildLine():
                Line((-10.145024857, 32.451170559), (-10.145024857, 21))
                Line((-10.145024857, 21), (10.145024857, 21))
                Line((10.145024857, 21), (10.145024857, 32.451170559))
                ThreePointArc((10.145024857, 32.451170559), (0, 34), (-10.145024857, 32.451170559))
            make_face()
            with BuildLine():
                Line((-21, 10.145024857), (-32.451170559, 10.145024857))
                ThreePointArc((-32.451170559, 10.145024857), (-34, 0), (-32.451170559, -10.145024857))
                Line((-32.451170559, -10.145024857), (-21, -10.145024857))
                Line((-21, -10.145024857), (-21, 10.145024857))
            make_face()
            with BuildLine():
                Line((-11, -21), (-11, -32.171415884))
                ThreePointArc((-11, -32.171415884), (-9.510045859, -32.642901644), (-8, -33.045423284))
                Line((-8, -33.045423284), (-8, -21))
                Line((-8, -21), (-11, -21))
            make_face()
            with BuildLine():
                ThreePointArc((8, -33.045423284), (9.510045859, -32.642901644), (11, -32.171415884))
                Line((11, -32.171415884), (11, -21))
                Line((11, -21), (8, -21))
                Line((8, -21), (8, -33.045423284))
            make_face()
            with BuildLine():
                ThreePointArc((34, 0), (33.610562321, 5.131286437), (32.451170559, 10.145024857))
                Line((32.451170559, 10.145024857), (21, 10.145024857))
                Line((21, 10.145024857), (21, -10.145024857))
                Line((21, -10.145024857), (32.451170559, -10.145024857))
                ThreePointArc((32.451170559, -10.145024857), (33.610562321, -5.131286437), (34, 0))
            make_face()
        extrude(amount=-BOSS_EXTRUDE5_DEPTH)

    # Fillet3
    fillet3_edges = [part.edges().sort_by_distance(p)[0] for p in [
        (-10.145024857, -1, 21),
        (10.145024857, -1, 21),
        (-21, -1, -10.145024857),
        (-21, -1, 10.145024857),
        (21, -1, 10.145024857),
        (21, -1, -10.145024857),
    ]]
    fillet(fillet3_edges, radius=FILLET3_R)

    # Fillet4
    fillet4_edges = [part.edges().sort_by_distance(p)[0] for p in [
        (-8, -1, -21),
        (-11, -1, -21),
        (11, -1, -21),
        (8, -1, -21),
    ]]
    fillet(fillet4_edges, radius=FILLET4_R)

    # Fillet5
    fillet5_edges = [part.edges().sort_by_distance(p)[0] for p in [
        (-19.5, 1, -19.5),
        (19.5, 1, -19.5),
        (19.5, 1, 19.5),
        (-19.5, 1, 19.5),
    ]]
    fillet(fillet5_edges, radius=FILLET5_R)

    # Sketch16 → Cut-Extrude4 (cut, two sides: drawn at the far end of the back side and taken through both)
    with SkipClean():  # the faces are left unmerged after this step: merging them gives an invalid solid
        with BuildSketch(Plane.XZ.offset(-CUT_EXTRUDE4_DEPTH_BACK)):
            with Locations((-0.899558855, 28.5)):
                Rectangle(SKETCH16_W, SKETCH16_H)
        extrude(amount=CUT_EXTRUDE4_DEPTH + CUT_EXTRUDE4_DEPTH_BACK, mode=Mode.SUBTRACT)

    # Fillet6
    fillet6_edges = [part.edges().sort_by_distance(p)[0] for p in [
        (10.680923241, -1, 23),
        (-25.039968051, 1, 23),
        (25.039968051, 1, 23),
        (-10.680923241, -1, 23),
    ]]
    fillet(fillet6_edges, radius=FILLET6_R)


solid = part.part
